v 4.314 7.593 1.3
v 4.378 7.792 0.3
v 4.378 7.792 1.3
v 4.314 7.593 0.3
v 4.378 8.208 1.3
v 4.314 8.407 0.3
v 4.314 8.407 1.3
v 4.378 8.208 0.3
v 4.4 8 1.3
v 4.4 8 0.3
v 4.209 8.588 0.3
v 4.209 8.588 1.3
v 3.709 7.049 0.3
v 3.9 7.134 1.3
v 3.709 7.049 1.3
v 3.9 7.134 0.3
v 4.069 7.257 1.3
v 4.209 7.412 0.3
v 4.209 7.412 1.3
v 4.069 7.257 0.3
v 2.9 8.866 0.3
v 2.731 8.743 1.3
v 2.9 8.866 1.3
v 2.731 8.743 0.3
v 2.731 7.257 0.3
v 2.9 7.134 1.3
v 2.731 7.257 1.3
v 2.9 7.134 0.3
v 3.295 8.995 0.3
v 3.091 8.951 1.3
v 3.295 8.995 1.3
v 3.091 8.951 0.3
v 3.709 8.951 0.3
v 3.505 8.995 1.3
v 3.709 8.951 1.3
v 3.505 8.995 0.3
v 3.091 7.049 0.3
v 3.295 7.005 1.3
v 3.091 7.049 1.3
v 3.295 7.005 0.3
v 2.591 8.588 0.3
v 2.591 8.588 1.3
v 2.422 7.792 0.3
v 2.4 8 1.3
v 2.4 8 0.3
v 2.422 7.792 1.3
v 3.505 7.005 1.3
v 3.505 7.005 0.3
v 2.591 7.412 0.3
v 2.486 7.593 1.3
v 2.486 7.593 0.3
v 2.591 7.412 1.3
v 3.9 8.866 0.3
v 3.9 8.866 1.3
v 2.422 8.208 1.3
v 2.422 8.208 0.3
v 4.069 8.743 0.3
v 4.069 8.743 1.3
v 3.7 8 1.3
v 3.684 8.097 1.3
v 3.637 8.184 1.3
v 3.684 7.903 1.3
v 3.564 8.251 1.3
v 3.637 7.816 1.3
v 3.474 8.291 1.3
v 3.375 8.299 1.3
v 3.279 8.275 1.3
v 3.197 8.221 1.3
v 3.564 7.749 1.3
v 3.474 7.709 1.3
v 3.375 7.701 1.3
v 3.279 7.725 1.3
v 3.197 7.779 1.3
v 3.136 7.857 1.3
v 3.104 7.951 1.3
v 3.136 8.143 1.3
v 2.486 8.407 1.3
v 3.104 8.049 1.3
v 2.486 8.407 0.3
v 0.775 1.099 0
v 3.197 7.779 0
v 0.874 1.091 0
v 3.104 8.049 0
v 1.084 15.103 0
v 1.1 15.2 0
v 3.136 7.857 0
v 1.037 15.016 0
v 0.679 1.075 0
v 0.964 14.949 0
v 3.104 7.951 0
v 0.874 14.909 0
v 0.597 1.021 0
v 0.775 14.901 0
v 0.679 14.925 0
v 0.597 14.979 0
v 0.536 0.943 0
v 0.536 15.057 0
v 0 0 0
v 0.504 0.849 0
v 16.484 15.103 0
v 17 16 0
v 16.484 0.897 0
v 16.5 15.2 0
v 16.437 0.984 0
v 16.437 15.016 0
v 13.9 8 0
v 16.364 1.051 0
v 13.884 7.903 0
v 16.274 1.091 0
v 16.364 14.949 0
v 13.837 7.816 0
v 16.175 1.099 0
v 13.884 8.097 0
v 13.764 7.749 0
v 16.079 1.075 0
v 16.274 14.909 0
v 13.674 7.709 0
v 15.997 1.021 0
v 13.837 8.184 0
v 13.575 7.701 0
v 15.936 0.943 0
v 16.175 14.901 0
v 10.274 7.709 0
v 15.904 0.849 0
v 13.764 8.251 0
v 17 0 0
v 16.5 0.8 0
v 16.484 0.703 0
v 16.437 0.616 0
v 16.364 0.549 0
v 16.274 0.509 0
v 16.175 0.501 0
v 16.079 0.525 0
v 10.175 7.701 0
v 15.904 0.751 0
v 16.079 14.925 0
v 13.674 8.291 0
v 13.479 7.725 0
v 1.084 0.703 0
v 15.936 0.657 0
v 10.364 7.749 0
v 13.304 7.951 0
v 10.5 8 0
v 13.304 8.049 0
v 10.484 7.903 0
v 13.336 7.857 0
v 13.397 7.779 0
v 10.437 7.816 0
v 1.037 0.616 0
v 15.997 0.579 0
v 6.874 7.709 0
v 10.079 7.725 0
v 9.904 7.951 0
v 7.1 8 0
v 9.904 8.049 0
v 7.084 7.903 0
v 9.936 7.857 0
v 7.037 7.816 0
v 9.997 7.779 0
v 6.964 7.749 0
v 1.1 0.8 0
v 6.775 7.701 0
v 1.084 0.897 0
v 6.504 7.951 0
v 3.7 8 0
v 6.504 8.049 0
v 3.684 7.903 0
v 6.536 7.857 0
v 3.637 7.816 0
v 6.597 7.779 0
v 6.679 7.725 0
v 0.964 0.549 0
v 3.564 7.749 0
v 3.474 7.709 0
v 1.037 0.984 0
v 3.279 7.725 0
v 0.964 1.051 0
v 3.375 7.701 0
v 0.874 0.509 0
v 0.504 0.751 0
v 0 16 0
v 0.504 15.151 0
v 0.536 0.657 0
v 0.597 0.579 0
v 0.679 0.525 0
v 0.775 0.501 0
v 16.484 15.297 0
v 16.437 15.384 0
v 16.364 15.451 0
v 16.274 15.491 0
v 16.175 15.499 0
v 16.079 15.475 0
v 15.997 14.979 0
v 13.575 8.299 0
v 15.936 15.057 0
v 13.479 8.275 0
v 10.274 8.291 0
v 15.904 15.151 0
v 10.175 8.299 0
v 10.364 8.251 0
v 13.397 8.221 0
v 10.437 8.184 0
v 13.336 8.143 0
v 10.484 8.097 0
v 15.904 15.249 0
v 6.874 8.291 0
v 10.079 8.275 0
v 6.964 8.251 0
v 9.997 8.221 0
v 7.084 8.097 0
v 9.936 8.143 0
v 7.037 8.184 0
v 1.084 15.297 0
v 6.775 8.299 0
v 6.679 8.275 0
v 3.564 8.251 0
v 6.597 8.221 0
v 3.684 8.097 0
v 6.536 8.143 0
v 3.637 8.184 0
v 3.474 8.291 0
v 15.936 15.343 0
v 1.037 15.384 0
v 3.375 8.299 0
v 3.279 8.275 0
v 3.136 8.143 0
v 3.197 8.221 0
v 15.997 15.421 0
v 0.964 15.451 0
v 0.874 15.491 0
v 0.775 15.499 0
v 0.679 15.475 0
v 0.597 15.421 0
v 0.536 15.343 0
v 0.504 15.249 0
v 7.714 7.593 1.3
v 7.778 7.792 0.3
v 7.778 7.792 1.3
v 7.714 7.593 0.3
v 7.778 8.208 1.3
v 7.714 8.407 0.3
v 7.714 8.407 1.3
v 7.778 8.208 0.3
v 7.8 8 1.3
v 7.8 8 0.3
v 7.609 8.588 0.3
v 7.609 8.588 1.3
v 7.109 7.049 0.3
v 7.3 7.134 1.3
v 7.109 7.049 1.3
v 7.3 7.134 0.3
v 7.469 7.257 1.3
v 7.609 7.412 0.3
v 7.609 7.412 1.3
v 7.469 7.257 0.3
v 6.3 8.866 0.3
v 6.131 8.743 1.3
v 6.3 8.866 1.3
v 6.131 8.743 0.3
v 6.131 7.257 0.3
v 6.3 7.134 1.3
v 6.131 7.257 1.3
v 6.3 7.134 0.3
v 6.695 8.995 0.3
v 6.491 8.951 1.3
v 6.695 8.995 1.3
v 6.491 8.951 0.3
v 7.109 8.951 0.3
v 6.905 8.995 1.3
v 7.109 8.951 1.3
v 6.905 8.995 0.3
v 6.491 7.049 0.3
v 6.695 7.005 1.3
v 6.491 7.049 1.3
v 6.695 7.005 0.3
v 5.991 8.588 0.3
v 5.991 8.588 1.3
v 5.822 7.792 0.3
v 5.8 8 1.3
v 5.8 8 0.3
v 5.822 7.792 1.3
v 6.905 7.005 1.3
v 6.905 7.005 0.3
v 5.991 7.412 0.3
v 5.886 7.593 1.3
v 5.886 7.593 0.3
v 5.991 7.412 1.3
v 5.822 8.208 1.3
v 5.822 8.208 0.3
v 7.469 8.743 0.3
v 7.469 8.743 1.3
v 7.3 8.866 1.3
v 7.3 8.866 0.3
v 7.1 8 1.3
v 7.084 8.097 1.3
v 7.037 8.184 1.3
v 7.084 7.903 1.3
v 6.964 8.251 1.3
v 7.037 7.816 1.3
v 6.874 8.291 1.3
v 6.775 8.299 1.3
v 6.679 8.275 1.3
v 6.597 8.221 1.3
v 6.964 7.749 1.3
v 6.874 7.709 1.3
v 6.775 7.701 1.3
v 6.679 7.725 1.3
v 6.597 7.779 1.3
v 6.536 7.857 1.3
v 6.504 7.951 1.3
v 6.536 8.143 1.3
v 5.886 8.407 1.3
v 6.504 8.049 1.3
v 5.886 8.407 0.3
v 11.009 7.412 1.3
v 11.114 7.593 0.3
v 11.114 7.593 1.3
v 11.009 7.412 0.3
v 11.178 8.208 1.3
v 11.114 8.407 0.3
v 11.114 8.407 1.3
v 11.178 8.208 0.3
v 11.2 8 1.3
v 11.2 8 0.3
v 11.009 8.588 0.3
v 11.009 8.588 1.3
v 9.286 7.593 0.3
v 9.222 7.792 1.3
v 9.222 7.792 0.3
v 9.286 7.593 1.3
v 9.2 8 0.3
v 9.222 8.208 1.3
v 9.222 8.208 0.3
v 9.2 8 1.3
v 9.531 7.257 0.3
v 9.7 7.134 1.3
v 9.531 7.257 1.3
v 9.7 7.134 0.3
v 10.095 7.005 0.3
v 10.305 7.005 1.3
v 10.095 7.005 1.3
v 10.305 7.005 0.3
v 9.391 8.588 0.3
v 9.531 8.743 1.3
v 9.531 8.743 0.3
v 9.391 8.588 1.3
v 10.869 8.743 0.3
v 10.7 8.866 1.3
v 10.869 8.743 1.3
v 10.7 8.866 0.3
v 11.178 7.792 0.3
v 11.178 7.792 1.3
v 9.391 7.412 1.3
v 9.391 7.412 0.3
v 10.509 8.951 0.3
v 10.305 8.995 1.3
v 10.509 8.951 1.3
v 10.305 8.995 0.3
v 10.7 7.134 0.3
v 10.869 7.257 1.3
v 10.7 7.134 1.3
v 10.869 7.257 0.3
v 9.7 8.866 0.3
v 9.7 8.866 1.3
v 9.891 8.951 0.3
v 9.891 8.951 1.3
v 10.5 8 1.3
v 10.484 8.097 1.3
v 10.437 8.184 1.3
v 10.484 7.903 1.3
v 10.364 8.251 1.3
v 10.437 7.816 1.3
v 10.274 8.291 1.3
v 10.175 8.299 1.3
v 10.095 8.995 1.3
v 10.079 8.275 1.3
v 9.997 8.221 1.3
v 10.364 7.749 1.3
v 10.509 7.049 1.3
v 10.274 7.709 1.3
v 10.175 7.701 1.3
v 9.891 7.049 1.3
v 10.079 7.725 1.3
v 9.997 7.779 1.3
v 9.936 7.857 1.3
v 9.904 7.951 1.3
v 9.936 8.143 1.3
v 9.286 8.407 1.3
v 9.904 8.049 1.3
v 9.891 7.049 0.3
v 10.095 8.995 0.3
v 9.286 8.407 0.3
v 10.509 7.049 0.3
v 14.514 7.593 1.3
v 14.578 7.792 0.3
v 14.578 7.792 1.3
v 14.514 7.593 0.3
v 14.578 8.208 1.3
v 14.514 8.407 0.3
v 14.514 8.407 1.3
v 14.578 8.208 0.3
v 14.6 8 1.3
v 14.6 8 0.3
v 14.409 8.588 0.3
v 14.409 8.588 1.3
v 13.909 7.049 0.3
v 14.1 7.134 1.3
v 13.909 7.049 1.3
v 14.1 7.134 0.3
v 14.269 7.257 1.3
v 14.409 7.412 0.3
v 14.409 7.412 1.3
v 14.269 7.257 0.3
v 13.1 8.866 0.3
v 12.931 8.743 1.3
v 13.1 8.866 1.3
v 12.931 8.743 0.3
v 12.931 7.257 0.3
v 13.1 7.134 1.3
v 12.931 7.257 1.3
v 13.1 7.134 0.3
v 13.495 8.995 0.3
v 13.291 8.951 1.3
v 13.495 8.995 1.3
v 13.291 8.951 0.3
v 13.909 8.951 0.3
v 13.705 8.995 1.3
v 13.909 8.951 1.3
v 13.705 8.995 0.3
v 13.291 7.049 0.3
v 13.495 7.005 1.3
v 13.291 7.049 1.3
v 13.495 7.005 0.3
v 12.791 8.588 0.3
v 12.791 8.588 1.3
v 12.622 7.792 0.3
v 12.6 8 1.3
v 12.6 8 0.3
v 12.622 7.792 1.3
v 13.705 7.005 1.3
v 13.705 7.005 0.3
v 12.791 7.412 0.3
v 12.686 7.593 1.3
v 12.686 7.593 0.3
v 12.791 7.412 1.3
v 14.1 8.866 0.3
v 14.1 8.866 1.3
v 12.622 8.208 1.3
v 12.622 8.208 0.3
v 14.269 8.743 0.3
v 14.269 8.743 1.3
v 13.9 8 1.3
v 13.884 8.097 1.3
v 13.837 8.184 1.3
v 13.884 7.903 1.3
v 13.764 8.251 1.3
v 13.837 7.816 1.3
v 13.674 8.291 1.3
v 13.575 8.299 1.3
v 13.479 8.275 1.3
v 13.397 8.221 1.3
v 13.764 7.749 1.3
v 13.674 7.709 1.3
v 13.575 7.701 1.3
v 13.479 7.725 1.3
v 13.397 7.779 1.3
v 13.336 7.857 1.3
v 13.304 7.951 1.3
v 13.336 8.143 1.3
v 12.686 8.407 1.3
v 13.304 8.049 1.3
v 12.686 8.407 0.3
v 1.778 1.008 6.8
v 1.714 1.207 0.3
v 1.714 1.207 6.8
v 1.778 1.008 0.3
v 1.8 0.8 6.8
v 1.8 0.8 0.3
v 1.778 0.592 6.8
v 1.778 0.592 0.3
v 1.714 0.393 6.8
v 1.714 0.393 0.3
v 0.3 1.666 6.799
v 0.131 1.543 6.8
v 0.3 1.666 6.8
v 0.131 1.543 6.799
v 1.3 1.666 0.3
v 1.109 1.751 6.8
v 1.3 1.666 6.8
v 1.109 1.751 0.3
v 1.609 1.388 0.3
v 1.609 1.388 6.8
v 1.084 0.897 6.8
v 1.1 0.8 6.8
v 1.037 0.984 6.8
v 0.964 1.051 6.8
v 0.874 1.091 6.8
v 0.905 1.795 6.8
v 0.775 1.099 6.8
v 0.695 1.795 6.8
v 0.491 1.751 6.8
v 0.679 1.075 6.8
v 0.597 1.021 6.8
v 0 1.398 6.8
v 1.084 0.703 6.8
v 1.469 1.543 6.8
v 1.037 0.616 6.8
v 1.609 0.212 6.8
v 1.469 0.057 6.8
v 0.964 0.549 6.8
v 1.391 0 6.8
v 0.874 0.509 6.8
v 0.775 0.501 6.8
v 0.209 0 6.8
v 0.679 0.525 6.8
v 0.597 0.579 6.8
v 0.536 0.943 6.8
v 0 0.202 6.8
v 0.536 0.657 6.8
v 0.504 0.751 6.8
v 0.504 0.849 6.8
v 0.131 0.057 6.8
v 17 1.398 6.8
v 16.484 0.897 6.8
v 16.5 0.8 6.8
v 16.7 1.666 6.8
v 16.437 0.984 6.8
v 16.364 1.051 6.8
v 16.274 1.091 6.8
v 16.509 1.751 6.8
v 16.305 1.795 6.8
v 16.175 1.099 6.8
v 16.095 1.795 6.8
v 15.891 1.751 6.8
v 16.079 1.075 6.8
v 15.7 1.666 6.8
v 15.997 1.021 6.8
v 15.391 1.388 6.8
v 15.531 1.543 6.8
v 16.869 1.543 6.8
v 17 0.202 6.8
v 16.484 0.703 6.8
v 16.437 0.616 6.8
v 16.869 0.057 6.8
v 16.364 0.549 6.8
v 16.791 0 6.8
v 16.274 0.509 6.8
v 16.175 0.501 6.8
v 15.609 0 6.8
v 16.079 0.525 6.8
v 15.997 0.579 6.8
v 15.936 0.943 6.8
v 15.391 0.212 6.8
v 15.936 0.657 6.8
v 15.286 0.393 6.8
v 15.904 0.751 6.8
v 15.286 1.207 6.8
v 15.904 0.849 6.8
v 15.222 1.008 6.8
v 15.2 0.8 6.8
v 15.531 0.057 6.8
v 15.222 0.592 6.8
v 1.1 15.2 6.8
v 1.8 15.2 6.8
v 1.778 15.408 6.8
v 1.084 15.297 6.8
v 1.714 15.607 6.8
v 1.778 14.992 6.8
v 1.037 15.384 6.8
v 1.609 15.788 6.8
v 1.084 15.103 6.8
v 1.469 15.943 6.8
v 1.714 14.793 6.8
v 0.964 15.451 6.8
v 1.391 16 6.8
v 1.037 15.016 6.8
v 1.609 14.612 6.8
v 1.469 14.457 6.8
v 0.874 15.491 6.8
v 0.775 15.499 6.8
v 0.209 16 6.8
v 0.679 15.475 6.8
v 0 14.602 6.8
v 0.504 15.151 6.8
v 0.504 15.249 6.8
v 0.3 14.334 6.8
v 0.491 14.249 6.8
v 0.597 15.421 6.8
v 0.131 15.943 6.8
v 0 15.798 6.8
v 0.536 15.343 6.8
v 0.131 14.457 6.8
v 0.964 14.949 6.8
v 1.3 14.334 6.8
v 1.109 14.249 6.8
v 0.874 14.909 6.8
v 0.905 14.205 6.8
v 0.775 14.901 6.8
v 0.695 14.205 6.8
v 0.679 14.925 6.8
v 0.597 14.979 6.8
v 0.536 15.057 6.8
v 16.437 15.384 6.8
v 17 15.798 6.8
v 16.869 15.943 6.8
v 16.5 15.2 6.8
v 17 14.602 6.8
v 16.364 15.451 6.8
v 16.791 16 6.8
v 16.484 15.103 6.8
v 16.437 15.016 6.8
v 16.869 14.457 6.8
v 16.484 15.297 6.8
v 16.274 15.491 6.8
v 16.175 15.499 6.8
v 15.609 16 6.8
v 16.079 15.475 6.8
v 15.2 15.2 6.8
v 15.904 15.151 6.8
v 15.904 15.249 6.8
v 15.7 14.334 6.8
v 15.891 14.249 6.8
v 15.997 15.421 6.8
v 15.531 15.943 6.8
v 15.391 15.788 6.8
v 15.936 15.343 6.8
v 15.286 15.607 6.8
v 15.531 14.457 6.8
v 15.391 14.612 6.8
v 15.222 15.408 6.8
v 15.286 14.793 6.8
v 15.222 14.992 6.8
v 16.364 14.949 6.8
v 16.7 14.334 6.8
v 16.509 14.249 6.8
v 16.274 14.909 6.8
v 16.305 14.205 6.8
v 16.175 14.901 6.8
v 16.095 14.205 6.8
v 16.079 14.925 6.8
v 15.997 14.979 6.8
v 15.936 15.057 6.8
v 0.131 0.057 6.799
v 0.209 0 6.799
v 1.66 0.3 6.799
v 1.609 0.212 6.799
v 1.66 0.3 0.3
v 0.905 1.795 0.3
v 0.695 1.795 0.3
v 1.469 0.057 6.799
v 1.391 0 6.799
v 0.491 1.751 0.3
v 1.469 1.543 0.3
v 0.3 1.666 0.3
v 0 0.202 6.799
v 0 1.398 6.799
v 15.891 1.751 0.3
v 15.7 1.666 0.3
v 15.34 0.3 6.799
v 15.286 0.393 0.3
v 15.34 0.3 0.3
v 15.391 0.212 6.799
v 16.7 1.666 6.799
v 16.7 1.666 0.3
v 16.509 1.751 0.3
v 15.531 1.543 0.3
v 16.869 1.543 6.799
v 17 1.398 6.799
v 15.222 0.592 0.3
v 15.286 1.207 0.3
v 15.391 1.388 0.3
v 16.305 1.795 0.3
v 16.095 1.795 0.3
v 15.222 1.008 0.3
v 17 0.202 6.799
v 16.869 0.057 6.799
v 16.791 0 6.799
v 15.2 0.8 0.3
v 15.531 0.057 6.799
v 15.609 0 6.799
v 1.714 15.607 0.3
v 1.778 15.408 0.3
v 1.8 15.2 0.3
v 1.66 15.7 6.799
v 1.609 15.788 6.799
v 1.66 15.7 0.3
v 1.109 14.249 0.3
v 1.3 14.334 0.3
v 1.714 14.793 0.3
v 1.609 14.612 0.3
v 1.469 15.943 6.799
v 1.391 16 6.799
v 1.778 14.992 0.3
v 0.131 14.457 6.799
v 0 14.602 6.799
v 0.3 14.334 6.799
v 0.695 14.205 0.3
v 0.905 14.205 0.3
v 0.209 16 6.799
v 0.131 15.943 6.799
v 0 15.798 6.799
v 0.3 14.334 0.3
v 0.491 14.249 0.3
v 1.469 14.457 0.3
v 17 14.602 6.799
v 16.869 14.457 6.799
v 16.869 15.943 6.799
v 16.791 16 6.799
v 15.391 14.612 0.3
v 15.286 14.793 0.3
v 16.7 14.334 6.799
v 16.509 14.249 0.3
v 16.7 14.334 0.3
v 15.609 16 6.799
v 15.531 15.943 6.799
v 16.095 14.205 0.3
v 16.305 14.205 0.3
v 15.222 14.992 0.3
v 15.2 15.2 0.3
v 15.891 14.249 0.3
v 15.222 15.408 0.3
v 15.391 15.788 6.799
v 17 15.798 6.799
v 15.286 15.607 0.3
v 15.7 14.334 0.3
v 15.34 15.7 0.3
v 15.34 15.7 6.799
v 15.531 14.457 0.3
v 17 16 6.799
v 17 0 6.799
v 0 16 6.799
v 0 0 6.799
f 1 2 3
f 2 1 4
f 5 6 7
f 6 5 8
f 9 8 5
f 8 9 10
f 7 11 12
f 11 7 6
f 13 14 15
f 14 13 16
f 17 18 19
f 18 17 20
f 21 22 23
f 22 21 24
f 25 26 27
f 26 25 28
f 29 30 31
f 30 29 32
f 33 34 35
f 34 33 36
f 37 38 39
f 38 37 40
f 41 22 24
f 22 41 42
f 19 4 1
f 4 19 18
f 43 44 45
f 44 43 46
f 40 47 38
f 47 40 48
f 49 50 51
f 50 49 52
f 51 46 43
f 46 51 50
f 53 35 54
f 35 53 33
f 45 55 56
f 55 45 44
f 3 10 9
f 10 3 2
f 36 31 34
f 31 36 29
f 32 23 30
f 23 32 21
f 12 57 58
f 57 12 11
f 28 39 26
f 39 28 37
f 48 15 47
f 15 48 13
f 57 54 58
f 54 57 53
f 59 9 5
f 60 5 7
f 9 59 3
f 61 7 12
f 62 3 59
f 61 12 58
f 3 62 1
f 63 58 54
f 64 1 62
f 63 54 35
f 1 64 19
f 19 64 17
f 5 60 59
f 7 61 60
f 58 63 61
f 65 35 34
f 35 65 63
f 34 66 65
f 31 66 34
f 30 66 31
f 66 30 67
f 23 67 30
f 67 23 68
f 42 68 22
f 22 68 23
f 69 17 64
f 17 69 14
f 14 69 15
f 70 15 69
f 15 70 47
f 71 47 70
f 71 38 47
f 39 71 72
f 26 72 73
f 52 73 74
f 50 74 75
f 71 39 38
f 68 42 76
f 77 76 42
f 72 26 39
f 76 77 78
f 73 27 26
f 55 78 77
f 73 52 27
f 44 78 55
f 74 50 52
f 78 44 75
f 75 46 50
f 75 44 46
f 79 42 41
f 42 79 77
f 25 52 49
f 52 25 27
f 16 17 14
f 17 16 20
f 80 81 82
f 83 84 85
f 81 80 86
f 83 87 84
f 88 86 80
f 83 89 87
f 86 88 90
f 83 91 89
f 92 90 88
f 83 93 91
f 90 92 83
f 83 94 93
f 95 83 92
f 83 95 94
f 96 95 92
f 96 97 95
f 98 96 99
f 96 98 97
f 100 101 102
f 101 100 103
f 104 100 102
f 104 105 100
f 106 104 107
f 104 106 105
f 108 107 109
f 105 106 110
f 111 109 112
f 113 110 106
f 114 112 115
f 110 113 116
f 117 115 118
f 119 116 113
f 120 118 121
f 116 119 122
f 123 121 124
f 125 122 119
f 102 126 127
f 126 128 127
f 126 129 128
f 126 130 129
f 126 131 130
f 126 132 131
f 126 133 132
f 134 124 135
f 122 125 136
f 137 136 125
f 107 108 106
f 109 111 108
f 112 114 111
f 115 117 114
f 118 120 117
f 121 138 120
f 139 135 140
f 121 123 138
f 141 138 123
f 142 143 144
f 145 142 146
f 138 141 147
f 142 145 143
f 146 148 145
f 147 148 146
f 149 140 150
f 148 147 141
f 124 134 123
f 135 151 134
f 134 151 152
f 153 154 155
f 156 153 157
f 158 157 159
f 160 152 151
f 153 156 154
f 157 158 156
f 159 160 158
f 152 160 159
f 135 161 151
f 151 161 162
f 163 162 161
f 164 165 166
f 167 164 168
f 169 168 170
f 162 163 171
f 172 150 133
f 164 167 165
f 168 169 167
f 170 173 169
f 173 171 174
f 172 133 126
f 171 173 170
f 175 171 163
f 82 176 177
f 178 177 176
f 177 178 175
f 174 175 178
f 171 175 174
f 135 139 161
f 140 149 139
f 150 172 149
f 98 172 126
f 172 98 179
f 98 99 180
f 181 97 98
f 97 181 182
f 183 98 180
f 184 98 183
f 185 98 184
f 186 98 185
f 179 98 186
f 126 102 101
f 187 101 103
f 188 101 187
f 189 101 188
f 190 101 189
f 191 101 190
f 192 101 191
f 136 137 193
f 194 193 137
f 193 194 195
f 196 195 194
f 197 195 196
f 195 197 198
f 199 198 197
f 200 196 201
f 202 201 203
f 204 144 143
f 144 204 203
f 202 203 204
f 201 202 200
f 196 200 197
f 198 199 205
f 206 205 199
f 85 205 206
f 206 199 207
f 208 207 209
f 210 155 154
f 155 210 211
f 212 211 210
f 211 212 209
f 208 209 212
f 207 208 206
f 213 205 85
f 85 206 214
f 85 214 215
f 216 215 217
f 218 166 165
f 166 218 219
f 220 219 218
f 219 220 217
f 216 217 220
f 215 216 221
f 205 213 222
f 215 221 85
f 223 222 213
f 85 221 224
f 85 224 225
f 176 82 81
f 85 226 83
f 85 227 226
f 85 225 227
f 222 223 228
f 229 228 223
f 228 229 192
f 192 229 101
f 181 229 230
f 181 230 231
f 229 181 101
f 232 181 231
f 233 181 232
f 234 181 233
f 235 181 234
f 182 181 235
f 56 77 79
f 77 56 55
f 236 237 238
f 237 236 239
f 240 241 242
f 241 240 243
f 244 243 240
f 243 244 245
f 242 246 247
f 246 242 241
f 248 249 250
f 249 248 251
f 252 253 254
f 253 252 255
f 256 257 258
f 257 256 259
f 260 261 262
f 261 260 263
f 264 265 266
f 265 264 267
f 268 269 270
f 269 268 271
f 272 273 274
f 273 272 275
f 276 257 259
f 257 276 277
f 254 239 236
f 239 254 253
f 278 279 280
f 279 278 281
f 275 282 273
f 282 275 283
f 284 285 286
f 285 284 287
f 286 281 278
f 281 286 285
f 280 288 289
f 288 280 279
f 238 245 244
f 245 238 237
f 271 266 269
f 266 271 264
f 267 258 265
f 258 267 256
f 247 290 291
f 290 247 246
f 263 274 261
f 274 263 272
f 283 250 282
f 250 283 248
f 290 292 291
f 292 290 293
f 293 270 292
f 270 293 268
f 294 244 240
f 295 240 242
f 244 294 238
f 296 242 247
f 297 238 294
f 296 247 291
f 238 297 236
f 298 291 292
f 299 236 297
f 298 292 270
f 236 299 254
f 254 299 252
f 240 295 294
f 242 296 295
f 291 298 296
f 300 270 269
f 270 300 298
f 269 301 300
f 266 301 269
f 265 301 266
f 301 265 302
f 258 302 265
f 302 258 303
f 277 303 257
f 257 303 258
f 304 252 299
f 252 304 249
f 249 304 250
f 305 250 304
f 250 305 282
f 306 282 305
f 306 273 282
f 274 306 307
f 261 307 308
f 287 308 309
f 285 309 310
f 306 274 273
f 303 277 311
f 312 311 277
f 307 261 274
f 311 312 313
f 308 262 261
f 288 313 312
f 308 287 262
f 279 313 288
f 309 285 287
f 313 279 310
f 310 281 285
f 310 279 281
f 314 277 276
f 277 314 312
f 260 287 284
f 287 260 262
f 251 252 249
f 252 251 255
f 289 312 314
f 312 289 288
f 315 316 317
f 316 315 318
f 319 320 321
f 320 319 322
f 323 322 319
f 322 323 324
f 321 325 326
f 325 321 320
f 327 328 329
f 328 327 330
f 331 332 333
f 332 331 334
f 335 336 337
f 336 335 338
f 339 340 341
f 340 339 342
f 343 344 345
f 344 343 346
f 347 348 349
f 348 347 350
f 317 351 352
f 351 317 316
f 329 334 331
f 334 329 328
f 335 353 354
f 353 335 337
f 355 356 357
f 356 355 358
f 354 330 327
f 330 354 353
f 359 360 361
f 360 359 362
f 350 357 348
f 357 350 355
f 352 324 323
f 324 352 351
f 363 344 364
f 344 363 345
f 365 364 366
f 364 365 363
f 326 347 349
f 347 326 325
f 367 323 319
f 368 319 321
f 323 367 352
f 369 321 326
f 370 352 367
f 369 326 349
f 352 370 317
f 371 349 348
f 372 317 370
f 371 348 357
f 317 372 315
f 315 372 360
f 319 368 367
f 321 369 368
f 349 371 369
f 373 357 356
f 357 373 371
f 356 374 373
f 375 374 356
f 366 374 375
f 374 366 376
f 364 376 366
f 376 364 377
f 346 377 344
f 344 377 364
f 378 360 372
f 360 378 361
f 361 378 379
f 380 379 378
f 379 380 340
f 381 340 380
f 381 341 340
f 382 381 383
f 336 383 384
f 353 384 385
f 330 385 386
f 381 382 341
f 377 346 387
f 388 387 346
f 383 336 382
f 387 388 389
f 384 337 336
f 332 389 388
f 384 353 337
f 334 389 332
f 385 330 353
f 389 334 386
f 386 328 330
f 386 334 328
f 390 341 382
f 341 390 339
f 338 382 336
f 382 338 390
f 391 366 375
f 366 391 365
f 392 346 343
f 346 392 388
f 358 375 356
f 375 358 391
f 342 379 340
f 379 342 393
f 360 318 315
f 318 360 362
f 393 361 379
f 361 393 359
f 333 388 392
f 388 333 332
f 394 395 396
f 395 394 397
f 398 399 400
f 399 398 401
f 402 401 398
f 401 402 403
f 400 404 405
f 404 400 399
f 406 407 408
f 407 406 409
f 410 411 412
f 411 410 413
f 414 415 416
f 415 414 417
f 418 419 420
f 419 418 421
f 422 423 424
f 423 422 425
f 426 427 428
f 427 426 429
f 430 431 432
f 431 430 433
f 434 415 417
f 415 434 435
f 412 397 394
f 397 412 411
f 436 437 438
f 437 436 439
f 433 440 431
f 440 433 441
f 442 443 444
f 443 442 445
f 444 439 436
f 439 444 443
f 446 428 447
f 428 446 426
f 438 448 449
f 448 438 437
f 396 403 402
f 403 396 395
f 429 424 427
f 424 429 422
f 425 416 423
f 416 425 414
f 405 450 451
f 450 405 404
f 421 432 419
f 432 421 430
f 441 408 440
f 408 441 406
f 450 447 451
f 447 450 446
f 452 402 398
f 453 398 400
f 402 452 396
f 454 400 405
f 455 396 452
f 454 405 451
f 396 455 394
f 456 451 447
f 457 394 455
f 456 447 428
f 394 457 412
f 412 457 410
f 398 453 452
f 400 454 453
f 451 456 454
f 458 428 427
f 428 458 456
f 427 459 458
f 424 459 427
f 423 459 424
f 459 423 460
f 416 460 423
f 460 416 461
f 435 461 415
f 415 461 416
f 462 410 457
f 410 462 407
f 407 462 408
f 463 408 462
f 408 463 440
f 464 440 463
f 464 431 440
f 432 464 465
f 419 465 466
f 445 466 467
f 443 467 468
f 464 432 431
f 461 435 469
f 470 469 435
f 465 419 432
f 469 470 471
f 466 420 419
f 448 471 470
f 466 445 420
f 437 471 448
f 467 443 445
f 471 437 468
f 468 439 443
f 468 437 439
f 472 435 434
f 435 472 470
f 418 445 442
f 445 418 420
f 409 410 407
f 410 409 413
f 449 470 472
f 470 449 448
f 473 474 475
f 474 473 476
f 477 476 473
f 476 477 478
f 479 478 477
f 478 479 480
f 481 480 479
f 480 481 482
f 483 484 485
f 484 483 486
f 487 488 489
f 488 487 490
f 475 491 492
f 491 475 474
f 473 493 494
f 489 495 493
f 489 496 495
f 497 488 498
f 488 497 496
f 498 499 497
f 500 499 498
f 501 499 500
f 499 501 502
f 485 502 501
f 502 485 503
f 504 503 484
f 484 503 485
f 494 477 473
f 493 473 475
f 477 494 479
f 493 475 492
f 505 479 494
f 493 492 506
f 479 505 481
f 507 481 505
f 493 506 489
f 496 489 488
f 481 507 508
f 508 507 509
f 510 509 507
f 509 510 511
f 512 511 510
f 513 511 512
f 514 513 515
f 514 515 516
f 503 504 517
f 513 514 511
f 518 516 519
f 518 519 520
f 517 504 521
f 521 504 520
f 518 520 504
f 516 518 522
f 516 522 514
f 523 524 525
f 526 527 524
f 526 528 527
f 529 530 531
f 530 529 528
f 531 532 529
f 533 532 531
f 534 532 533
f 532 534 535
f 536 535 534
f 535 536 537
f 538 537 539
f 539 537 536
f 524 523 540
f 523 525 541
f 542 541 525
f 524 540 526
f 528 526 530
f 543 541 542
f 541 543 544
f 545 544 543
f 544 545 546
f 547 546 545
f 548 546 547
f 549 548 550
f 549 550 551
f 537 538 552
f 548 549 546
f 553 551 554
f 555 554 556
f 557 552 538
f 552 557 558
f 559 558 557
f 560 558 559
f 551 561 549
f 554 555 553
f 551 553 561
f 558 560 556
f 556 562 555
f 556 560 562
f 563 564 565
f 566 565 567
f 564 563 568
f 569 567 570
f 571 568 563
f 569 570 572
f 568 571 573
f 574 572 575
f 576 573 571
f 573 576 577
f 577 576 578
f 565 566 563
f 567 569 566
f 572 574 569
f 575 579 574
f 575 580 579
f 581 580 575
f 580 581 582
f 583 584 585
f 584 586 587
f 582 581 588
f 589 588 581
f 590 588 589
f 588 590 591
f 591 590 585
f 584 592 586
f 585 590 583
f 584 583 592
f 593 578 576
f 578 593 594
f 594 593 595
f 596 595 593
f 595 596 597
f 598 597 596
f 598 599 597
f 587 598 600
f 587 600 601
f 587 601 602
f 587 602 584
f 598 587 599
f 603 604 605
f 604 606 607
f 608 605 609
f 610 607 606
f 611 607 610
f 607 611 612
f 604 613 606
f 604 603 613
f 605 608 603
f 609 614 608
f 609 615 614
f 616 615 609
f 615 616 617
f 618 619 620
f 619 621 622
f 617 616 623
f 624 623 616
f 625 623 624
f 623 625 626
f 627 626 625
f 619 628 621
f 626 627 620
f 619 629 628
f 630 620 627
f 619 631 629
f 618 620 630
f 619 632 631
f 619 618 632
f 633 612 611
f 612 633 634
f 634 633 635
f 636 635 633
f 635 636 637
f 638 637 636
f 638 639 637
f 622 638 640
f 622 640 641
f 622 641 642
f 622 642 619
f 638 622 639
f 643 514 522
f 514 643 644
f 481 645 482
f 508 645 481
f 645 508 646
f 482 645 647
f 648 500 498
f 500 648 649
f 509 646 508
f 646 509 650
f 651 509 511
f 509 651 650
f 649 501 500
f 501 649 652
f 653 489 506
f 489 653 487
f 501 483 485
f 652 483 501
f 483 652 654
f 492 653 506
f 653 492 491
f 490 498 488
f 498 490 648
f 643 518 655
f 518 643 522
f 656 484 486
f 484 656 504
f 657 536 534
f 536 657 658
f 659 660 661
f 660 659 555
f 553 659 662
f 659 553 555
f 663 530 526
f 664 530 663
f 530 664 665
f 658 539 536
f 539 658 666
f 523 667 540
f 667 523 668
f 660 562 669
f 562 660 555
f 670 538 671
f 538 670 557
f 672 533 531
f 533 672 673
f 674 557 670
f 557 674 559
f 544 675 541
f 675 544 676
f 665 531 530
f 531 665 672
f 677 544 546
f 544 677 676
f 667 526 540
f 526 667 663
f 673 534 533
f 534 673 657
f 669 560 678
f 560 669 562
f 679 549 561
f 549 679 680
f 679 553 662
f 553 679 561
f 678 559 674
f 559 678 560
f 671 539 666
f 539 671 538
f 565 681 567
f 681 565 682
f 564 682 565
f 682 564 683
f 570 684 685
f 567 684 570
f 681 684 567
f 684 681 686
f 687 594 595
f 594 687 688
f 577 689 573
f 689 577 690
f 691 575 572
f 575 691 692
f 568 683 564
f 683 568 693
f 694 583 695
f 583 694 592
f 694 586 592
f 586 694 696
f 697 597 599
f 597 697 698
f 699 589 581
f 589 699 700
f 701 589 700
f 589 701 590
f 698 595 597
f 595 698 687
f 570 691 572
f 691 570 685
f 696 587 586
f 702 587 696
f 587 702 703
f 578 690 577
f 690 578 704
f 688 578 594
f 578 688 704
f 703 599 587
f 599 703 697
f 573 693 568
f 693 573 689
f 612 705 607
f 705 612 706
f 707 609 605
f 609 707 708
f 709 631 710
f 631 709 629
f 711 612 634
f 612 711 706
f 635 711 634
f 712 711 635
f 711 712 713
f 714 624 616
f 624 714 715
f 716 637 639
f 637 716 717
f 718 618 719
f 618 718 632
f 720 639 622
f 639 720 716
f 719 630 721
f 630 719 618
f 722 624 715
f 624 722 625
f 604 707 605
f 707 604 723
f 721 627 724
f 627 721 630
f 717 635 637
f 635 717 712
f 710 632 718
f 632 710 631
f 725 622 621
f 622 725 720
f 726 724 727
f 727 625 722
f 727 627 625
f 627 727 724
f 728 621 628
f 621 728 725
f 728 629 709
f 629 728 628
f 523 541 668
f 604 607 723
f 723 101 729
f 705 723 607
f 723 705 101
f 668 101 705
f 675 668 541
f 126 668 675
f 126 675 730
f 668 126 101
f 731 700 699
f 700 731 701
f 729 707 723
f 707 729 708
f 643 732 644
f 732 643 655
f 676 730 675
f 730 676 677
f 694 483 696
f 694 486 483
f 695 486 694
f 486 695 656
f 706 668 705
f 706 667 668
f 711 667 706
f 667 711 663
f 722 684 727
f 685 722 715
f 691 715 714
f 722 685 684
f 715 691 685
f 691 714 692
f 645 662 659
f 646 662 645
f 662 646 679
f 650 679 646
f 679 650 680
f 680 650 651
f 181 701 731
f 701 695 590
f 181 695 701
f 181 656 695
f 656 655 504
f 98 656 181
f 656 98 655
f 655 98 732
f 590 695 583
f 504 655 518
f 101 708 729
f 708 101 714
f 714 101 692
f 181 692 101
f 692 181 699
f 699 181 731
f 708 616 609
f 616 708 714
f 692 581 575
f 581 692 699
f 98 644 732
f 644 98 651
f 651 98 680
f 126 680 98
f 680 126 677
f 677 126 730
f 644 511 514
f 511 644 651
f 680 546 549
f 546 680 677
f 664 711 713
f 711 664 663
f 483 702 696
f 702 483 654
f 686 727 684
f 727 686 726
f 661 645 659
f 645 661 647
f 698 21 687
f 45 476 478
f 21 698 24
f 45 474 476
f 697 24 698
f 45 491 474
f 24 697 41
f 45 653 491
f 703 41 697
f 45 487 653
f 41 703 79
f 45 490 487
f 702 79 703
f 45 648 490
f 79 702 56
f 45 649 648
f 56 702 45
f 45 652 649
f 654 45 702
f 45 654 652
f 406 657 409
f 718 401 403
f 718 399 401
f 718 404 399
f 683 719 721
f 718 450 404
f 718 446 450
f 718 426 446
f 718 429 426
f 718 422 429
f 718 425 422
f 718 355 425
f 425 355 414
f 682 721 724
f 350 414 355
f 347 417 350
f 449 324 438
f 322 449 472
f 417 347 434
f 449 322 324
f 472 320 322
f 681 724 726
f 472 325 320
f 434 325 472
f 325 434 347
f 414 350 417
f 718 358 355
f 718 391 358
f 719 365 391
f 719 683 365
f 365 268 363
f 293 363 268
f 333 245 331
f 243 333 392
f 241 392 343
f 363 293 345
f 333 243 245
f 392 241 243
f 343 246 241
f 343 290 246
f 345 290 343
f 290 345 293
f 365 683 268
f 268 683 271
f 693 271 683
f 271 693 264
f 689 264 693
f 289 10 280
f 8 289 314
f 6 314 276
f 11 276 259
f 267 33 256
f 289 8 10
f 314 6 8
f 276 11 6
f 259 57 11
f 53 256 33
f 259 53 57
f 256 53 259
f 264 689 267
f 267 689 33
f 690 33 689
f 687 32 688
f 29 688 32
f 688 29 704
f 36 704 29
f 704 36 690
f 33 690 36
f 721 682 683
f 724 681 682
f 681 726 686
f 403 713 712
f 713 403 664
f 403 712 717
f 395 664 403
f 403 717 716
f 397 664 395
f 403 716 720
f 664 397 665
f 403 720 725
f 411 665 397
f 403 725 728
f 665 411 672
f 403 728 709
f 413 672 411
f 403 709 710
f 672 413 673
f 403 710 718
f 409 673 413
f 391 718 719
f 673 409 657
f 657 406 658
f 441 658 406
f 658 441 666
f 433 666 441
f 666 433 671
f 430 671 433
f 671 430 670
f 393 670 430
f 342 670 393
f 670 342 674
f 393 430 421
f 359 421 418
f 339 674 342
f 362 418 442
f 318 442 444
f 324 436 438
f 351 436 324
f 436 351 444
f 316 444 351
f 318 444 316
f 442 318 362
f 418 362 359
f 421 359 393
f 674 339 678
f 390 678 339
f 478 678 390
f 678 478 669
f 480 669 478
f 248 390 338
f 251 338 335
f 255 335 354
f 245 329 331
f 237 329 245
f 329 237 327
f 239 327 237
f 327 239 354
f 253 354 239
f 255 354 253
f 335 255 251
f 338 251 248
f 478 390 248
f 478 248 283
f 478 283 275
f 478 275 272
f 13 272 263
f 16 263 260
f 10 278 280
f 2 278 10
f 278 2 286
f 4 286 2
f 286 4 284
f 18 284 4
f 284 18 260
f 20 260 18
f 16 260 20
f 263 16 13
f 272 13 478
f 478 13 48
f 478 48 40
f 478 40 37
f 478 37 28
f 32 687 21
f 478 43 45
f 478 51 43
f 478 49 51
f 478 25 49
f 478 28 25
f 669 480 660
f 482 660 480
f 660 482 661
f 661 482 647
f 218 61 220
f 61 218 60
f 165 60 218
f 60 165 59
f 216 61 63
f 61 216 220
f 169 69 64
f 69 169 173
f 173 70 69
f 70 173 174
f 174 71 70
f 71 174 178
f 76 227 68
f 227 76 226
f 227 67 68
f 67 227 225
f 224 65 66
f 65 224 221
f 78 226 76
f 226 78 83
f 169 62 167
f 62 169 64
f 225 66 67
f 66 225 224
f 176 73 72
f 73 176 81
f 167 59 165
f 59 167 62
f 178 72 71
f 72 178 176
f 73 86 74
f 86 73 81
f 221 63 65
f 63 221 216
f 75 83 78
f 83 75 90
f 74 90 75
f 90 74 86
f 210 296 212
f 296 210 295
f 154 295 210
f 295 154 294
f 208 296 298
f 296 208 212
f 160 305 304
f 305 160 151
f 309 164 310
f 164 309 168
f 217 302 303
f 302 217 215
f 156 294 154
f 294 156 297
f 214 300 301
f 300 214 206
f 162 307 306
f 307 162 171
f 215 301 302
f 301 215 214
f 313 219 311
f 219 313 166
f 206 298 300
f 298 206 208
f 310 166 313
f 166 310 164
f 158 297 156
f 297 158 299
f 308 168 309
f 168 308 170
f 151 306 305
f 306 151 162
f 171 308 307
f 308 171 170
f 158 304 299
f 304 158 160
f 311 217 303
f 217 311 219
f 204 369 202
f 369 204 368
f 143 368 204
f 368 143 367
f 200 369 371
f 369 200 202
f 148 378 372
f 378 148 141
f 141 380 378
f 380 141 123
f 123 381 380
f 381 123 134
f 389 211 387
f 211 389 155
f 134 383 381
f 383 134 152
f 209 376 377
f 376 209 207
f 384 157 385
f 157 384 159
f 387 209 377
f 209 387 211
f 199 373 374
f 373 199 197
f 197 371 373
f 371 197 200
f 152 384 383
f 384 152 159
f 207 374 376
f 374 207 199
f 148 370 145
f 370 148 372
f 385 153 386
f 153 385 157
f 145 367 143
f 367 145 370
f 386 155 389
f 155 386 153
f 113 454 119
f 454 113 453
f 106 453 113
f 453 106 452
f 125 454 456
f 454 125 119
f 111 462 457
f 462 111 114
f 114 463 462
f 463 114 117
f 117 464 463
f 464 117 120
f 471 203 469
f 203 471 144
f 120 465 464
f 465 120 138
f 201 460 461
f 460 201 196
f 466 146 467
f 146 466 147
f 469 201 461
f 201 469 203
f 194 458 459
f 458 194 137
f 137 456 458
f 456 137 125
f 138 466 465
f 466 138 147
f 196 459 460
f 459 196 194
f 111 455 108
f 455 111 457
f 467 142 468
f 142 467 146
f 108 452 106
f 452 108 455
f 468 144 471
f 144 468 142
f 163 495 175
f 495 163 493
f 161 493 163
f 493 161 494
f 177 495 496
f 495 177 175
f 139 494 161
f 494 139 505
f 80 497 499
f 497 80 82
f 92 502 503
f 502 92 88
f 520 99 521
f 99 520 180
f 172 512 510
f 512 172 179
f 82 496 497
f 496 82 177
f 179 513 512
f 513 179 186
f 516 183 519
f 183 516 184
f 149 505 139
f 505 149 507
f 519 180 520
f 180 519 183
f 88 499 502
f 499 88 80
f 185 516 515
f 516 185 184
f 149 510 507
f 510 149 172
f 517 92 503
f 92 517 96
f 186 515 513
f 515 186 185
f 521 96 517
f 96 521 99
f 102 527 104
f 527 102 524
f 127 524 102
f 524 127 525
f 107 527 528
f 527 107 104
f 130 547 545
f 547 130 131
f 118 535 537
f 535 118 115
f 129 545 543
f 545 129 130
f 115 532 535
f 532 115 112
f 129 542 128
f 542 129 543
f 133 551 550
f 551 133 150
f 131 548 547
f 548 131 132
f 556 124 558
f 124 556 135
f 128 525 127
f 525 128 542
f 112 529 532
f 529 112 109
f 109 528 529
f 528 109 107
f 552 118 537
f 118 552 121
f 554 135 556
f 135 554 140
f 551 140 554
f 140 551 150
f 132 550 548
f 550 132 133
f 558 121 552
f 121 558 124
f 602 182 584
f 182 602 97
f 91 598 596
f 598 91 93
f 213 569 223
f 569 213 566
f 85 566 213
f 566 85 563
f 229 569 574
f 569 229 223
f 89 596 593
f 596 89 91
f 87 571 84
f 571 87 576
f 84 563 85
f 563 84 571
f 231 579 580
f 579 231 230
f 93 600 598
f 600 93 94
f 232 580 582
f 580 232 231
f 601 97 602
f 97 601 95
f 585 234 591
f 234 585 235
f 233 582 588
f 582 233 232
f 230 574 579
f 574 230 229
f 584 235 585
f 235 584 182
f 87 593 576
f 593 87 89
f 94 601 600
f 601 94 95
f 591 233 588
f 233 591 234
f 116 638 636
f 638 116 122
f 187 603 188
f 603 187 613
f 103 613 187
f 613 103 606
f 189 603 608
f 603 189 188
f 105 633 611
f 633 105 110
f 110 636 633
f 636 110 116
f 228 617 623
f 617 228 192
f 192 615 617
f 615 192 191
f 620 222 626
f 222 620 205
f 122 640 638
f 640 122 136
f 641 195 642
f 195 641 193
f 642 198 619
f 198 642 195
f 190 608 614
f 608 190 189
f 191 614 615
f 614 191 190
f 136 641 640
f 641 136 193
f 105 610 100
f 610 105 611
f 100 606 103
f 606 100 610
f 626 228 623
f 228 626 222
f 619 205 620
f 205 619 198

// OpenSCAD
//Hecho por Xibhu

//Cambiar para cambiar el objeto a renderizar. Sacar los archivos STL o los necesarios uno a uno
objetoParaMostrar = 0;

if(objetoParaMostrar == 0){
    caja();
}
if(objetoParaMostrar == 1){
    tapa();
}

//$fa = 1;
$fs = 0.1;
overlap = 0.001;

//Medidas para la tapa
rectanguloInteriorLadoA = 4.6;
rectanguloInteriorLadoB = 15;
margenesLateralesLadoB = 2; //la mitad por cada lado
gruesoTapa = 0.3;

//Medidas para la caja y tapa
baseLadoA = 16;
baseLadoB = rectanguloInteriorLadoB + margenesLateralesLadoB;
gruesoBase = 0.3;

//Medidas de los separadores de la caja
altoSeparadorRail = 1;
cantidadSeparadores = 4;

//Medida para las paredes de la caja
altoParedes = 5.5 + altoSeparadorRail;
gruesoParedes = 0.3;

//Tornillería
radioTornillo = 0.3;
radioSeparador = 1;

offsetPilares = 0.5; //separación de los bordes
posicionesPilaresX = [gruesoParedes + offsetPilares, baseLadoB - gruesoParedes - offsetPilares];
posicionesPilaresY = [gruesoParedes + offsetPilares, baseLadoA - gruesoParedes - offsetPilares];

module caja(){
    difference(){
        union(){
            cube([  baseLadoB,
                baseLadoA,
                gruesoBase]);

            separadoresRailes(0)
            cylinder(altoSeparadorRail + gruesoBase, radioSeparador, radioSeparador);
            
            pilaresTapa(0)
            cylinder(altoParedes + gruesoBase, radioSeparador, radioSeparador);
            
            difference(){
                translate([0,0,gruesoBase - overlap])
                cube([  baseLadoB,
                        baseLadoA,
                        altoParedes]);

                translate([gruesoParedes, gruesoParedes, gruesoBase - overlap])
                cube([  baseLadoB - ( gruesoParedes * 2 ),
                        baseLadoA - ( gruesoParedes * 2 ),
                        altoParedes + overlap]);
        
                }
        
        }

        separadoresRailes(-overlap)
        cylinder(altoSeparadorRail + gruesoBase + (overlap * 2), radioTornillo, radioTornillo);
        pilaresTapa(-overlap)
        cylinder(altoParedes + gruesoBase + (overlap * 2), radioTornillo, radioTornillo);
    
        difference(){
            translate([-1,-1,-0.5])
            cube([baseLadoB + 2, baseLadoA + 2, altoParedes + 1]);
            translate([0,0,0])
            cube([baseLadoB, baseLadoA , altoParedes + gruesoBase]);
            
            
        }
    }
    
    }
    

module tapa(){
    difference(){
        translate([0,0,0])
        cube([baseLadoB, baseLadoA, gruesoTapa]);
        translate([baseLadoB / 2, baseLadoA / 2, 0])
        cube([rectanguloInteriorLadoB, rectanguloInteriorLadoA, 1], center = true);
        pilaresTapa(-overlap)
        cylinder(1, radioTornillo, radioTornillo);
        }
    
    }


//Colocación de los separadores
module separadoresRailes(inicioZ){
    for( i = [ 1 : cantidadSeparadores ] ){
            translate([(i/(cantidadSeparadores + 1)) * baseLadoB, baseLadoA / 2, inicioZ])
            children();
        }
    }

//Posición de los pilares en las esquinas para el cierre de la tapa con varillas roscadas
module pilaresTapa(inicioZ){
        for(i = [0:1]){
                for(j = [0:1]){
                    translate([posicionesPilaresX[j], posicionesPilaresY[i], inicioZ])
                    children();
                    }
            }
    }
